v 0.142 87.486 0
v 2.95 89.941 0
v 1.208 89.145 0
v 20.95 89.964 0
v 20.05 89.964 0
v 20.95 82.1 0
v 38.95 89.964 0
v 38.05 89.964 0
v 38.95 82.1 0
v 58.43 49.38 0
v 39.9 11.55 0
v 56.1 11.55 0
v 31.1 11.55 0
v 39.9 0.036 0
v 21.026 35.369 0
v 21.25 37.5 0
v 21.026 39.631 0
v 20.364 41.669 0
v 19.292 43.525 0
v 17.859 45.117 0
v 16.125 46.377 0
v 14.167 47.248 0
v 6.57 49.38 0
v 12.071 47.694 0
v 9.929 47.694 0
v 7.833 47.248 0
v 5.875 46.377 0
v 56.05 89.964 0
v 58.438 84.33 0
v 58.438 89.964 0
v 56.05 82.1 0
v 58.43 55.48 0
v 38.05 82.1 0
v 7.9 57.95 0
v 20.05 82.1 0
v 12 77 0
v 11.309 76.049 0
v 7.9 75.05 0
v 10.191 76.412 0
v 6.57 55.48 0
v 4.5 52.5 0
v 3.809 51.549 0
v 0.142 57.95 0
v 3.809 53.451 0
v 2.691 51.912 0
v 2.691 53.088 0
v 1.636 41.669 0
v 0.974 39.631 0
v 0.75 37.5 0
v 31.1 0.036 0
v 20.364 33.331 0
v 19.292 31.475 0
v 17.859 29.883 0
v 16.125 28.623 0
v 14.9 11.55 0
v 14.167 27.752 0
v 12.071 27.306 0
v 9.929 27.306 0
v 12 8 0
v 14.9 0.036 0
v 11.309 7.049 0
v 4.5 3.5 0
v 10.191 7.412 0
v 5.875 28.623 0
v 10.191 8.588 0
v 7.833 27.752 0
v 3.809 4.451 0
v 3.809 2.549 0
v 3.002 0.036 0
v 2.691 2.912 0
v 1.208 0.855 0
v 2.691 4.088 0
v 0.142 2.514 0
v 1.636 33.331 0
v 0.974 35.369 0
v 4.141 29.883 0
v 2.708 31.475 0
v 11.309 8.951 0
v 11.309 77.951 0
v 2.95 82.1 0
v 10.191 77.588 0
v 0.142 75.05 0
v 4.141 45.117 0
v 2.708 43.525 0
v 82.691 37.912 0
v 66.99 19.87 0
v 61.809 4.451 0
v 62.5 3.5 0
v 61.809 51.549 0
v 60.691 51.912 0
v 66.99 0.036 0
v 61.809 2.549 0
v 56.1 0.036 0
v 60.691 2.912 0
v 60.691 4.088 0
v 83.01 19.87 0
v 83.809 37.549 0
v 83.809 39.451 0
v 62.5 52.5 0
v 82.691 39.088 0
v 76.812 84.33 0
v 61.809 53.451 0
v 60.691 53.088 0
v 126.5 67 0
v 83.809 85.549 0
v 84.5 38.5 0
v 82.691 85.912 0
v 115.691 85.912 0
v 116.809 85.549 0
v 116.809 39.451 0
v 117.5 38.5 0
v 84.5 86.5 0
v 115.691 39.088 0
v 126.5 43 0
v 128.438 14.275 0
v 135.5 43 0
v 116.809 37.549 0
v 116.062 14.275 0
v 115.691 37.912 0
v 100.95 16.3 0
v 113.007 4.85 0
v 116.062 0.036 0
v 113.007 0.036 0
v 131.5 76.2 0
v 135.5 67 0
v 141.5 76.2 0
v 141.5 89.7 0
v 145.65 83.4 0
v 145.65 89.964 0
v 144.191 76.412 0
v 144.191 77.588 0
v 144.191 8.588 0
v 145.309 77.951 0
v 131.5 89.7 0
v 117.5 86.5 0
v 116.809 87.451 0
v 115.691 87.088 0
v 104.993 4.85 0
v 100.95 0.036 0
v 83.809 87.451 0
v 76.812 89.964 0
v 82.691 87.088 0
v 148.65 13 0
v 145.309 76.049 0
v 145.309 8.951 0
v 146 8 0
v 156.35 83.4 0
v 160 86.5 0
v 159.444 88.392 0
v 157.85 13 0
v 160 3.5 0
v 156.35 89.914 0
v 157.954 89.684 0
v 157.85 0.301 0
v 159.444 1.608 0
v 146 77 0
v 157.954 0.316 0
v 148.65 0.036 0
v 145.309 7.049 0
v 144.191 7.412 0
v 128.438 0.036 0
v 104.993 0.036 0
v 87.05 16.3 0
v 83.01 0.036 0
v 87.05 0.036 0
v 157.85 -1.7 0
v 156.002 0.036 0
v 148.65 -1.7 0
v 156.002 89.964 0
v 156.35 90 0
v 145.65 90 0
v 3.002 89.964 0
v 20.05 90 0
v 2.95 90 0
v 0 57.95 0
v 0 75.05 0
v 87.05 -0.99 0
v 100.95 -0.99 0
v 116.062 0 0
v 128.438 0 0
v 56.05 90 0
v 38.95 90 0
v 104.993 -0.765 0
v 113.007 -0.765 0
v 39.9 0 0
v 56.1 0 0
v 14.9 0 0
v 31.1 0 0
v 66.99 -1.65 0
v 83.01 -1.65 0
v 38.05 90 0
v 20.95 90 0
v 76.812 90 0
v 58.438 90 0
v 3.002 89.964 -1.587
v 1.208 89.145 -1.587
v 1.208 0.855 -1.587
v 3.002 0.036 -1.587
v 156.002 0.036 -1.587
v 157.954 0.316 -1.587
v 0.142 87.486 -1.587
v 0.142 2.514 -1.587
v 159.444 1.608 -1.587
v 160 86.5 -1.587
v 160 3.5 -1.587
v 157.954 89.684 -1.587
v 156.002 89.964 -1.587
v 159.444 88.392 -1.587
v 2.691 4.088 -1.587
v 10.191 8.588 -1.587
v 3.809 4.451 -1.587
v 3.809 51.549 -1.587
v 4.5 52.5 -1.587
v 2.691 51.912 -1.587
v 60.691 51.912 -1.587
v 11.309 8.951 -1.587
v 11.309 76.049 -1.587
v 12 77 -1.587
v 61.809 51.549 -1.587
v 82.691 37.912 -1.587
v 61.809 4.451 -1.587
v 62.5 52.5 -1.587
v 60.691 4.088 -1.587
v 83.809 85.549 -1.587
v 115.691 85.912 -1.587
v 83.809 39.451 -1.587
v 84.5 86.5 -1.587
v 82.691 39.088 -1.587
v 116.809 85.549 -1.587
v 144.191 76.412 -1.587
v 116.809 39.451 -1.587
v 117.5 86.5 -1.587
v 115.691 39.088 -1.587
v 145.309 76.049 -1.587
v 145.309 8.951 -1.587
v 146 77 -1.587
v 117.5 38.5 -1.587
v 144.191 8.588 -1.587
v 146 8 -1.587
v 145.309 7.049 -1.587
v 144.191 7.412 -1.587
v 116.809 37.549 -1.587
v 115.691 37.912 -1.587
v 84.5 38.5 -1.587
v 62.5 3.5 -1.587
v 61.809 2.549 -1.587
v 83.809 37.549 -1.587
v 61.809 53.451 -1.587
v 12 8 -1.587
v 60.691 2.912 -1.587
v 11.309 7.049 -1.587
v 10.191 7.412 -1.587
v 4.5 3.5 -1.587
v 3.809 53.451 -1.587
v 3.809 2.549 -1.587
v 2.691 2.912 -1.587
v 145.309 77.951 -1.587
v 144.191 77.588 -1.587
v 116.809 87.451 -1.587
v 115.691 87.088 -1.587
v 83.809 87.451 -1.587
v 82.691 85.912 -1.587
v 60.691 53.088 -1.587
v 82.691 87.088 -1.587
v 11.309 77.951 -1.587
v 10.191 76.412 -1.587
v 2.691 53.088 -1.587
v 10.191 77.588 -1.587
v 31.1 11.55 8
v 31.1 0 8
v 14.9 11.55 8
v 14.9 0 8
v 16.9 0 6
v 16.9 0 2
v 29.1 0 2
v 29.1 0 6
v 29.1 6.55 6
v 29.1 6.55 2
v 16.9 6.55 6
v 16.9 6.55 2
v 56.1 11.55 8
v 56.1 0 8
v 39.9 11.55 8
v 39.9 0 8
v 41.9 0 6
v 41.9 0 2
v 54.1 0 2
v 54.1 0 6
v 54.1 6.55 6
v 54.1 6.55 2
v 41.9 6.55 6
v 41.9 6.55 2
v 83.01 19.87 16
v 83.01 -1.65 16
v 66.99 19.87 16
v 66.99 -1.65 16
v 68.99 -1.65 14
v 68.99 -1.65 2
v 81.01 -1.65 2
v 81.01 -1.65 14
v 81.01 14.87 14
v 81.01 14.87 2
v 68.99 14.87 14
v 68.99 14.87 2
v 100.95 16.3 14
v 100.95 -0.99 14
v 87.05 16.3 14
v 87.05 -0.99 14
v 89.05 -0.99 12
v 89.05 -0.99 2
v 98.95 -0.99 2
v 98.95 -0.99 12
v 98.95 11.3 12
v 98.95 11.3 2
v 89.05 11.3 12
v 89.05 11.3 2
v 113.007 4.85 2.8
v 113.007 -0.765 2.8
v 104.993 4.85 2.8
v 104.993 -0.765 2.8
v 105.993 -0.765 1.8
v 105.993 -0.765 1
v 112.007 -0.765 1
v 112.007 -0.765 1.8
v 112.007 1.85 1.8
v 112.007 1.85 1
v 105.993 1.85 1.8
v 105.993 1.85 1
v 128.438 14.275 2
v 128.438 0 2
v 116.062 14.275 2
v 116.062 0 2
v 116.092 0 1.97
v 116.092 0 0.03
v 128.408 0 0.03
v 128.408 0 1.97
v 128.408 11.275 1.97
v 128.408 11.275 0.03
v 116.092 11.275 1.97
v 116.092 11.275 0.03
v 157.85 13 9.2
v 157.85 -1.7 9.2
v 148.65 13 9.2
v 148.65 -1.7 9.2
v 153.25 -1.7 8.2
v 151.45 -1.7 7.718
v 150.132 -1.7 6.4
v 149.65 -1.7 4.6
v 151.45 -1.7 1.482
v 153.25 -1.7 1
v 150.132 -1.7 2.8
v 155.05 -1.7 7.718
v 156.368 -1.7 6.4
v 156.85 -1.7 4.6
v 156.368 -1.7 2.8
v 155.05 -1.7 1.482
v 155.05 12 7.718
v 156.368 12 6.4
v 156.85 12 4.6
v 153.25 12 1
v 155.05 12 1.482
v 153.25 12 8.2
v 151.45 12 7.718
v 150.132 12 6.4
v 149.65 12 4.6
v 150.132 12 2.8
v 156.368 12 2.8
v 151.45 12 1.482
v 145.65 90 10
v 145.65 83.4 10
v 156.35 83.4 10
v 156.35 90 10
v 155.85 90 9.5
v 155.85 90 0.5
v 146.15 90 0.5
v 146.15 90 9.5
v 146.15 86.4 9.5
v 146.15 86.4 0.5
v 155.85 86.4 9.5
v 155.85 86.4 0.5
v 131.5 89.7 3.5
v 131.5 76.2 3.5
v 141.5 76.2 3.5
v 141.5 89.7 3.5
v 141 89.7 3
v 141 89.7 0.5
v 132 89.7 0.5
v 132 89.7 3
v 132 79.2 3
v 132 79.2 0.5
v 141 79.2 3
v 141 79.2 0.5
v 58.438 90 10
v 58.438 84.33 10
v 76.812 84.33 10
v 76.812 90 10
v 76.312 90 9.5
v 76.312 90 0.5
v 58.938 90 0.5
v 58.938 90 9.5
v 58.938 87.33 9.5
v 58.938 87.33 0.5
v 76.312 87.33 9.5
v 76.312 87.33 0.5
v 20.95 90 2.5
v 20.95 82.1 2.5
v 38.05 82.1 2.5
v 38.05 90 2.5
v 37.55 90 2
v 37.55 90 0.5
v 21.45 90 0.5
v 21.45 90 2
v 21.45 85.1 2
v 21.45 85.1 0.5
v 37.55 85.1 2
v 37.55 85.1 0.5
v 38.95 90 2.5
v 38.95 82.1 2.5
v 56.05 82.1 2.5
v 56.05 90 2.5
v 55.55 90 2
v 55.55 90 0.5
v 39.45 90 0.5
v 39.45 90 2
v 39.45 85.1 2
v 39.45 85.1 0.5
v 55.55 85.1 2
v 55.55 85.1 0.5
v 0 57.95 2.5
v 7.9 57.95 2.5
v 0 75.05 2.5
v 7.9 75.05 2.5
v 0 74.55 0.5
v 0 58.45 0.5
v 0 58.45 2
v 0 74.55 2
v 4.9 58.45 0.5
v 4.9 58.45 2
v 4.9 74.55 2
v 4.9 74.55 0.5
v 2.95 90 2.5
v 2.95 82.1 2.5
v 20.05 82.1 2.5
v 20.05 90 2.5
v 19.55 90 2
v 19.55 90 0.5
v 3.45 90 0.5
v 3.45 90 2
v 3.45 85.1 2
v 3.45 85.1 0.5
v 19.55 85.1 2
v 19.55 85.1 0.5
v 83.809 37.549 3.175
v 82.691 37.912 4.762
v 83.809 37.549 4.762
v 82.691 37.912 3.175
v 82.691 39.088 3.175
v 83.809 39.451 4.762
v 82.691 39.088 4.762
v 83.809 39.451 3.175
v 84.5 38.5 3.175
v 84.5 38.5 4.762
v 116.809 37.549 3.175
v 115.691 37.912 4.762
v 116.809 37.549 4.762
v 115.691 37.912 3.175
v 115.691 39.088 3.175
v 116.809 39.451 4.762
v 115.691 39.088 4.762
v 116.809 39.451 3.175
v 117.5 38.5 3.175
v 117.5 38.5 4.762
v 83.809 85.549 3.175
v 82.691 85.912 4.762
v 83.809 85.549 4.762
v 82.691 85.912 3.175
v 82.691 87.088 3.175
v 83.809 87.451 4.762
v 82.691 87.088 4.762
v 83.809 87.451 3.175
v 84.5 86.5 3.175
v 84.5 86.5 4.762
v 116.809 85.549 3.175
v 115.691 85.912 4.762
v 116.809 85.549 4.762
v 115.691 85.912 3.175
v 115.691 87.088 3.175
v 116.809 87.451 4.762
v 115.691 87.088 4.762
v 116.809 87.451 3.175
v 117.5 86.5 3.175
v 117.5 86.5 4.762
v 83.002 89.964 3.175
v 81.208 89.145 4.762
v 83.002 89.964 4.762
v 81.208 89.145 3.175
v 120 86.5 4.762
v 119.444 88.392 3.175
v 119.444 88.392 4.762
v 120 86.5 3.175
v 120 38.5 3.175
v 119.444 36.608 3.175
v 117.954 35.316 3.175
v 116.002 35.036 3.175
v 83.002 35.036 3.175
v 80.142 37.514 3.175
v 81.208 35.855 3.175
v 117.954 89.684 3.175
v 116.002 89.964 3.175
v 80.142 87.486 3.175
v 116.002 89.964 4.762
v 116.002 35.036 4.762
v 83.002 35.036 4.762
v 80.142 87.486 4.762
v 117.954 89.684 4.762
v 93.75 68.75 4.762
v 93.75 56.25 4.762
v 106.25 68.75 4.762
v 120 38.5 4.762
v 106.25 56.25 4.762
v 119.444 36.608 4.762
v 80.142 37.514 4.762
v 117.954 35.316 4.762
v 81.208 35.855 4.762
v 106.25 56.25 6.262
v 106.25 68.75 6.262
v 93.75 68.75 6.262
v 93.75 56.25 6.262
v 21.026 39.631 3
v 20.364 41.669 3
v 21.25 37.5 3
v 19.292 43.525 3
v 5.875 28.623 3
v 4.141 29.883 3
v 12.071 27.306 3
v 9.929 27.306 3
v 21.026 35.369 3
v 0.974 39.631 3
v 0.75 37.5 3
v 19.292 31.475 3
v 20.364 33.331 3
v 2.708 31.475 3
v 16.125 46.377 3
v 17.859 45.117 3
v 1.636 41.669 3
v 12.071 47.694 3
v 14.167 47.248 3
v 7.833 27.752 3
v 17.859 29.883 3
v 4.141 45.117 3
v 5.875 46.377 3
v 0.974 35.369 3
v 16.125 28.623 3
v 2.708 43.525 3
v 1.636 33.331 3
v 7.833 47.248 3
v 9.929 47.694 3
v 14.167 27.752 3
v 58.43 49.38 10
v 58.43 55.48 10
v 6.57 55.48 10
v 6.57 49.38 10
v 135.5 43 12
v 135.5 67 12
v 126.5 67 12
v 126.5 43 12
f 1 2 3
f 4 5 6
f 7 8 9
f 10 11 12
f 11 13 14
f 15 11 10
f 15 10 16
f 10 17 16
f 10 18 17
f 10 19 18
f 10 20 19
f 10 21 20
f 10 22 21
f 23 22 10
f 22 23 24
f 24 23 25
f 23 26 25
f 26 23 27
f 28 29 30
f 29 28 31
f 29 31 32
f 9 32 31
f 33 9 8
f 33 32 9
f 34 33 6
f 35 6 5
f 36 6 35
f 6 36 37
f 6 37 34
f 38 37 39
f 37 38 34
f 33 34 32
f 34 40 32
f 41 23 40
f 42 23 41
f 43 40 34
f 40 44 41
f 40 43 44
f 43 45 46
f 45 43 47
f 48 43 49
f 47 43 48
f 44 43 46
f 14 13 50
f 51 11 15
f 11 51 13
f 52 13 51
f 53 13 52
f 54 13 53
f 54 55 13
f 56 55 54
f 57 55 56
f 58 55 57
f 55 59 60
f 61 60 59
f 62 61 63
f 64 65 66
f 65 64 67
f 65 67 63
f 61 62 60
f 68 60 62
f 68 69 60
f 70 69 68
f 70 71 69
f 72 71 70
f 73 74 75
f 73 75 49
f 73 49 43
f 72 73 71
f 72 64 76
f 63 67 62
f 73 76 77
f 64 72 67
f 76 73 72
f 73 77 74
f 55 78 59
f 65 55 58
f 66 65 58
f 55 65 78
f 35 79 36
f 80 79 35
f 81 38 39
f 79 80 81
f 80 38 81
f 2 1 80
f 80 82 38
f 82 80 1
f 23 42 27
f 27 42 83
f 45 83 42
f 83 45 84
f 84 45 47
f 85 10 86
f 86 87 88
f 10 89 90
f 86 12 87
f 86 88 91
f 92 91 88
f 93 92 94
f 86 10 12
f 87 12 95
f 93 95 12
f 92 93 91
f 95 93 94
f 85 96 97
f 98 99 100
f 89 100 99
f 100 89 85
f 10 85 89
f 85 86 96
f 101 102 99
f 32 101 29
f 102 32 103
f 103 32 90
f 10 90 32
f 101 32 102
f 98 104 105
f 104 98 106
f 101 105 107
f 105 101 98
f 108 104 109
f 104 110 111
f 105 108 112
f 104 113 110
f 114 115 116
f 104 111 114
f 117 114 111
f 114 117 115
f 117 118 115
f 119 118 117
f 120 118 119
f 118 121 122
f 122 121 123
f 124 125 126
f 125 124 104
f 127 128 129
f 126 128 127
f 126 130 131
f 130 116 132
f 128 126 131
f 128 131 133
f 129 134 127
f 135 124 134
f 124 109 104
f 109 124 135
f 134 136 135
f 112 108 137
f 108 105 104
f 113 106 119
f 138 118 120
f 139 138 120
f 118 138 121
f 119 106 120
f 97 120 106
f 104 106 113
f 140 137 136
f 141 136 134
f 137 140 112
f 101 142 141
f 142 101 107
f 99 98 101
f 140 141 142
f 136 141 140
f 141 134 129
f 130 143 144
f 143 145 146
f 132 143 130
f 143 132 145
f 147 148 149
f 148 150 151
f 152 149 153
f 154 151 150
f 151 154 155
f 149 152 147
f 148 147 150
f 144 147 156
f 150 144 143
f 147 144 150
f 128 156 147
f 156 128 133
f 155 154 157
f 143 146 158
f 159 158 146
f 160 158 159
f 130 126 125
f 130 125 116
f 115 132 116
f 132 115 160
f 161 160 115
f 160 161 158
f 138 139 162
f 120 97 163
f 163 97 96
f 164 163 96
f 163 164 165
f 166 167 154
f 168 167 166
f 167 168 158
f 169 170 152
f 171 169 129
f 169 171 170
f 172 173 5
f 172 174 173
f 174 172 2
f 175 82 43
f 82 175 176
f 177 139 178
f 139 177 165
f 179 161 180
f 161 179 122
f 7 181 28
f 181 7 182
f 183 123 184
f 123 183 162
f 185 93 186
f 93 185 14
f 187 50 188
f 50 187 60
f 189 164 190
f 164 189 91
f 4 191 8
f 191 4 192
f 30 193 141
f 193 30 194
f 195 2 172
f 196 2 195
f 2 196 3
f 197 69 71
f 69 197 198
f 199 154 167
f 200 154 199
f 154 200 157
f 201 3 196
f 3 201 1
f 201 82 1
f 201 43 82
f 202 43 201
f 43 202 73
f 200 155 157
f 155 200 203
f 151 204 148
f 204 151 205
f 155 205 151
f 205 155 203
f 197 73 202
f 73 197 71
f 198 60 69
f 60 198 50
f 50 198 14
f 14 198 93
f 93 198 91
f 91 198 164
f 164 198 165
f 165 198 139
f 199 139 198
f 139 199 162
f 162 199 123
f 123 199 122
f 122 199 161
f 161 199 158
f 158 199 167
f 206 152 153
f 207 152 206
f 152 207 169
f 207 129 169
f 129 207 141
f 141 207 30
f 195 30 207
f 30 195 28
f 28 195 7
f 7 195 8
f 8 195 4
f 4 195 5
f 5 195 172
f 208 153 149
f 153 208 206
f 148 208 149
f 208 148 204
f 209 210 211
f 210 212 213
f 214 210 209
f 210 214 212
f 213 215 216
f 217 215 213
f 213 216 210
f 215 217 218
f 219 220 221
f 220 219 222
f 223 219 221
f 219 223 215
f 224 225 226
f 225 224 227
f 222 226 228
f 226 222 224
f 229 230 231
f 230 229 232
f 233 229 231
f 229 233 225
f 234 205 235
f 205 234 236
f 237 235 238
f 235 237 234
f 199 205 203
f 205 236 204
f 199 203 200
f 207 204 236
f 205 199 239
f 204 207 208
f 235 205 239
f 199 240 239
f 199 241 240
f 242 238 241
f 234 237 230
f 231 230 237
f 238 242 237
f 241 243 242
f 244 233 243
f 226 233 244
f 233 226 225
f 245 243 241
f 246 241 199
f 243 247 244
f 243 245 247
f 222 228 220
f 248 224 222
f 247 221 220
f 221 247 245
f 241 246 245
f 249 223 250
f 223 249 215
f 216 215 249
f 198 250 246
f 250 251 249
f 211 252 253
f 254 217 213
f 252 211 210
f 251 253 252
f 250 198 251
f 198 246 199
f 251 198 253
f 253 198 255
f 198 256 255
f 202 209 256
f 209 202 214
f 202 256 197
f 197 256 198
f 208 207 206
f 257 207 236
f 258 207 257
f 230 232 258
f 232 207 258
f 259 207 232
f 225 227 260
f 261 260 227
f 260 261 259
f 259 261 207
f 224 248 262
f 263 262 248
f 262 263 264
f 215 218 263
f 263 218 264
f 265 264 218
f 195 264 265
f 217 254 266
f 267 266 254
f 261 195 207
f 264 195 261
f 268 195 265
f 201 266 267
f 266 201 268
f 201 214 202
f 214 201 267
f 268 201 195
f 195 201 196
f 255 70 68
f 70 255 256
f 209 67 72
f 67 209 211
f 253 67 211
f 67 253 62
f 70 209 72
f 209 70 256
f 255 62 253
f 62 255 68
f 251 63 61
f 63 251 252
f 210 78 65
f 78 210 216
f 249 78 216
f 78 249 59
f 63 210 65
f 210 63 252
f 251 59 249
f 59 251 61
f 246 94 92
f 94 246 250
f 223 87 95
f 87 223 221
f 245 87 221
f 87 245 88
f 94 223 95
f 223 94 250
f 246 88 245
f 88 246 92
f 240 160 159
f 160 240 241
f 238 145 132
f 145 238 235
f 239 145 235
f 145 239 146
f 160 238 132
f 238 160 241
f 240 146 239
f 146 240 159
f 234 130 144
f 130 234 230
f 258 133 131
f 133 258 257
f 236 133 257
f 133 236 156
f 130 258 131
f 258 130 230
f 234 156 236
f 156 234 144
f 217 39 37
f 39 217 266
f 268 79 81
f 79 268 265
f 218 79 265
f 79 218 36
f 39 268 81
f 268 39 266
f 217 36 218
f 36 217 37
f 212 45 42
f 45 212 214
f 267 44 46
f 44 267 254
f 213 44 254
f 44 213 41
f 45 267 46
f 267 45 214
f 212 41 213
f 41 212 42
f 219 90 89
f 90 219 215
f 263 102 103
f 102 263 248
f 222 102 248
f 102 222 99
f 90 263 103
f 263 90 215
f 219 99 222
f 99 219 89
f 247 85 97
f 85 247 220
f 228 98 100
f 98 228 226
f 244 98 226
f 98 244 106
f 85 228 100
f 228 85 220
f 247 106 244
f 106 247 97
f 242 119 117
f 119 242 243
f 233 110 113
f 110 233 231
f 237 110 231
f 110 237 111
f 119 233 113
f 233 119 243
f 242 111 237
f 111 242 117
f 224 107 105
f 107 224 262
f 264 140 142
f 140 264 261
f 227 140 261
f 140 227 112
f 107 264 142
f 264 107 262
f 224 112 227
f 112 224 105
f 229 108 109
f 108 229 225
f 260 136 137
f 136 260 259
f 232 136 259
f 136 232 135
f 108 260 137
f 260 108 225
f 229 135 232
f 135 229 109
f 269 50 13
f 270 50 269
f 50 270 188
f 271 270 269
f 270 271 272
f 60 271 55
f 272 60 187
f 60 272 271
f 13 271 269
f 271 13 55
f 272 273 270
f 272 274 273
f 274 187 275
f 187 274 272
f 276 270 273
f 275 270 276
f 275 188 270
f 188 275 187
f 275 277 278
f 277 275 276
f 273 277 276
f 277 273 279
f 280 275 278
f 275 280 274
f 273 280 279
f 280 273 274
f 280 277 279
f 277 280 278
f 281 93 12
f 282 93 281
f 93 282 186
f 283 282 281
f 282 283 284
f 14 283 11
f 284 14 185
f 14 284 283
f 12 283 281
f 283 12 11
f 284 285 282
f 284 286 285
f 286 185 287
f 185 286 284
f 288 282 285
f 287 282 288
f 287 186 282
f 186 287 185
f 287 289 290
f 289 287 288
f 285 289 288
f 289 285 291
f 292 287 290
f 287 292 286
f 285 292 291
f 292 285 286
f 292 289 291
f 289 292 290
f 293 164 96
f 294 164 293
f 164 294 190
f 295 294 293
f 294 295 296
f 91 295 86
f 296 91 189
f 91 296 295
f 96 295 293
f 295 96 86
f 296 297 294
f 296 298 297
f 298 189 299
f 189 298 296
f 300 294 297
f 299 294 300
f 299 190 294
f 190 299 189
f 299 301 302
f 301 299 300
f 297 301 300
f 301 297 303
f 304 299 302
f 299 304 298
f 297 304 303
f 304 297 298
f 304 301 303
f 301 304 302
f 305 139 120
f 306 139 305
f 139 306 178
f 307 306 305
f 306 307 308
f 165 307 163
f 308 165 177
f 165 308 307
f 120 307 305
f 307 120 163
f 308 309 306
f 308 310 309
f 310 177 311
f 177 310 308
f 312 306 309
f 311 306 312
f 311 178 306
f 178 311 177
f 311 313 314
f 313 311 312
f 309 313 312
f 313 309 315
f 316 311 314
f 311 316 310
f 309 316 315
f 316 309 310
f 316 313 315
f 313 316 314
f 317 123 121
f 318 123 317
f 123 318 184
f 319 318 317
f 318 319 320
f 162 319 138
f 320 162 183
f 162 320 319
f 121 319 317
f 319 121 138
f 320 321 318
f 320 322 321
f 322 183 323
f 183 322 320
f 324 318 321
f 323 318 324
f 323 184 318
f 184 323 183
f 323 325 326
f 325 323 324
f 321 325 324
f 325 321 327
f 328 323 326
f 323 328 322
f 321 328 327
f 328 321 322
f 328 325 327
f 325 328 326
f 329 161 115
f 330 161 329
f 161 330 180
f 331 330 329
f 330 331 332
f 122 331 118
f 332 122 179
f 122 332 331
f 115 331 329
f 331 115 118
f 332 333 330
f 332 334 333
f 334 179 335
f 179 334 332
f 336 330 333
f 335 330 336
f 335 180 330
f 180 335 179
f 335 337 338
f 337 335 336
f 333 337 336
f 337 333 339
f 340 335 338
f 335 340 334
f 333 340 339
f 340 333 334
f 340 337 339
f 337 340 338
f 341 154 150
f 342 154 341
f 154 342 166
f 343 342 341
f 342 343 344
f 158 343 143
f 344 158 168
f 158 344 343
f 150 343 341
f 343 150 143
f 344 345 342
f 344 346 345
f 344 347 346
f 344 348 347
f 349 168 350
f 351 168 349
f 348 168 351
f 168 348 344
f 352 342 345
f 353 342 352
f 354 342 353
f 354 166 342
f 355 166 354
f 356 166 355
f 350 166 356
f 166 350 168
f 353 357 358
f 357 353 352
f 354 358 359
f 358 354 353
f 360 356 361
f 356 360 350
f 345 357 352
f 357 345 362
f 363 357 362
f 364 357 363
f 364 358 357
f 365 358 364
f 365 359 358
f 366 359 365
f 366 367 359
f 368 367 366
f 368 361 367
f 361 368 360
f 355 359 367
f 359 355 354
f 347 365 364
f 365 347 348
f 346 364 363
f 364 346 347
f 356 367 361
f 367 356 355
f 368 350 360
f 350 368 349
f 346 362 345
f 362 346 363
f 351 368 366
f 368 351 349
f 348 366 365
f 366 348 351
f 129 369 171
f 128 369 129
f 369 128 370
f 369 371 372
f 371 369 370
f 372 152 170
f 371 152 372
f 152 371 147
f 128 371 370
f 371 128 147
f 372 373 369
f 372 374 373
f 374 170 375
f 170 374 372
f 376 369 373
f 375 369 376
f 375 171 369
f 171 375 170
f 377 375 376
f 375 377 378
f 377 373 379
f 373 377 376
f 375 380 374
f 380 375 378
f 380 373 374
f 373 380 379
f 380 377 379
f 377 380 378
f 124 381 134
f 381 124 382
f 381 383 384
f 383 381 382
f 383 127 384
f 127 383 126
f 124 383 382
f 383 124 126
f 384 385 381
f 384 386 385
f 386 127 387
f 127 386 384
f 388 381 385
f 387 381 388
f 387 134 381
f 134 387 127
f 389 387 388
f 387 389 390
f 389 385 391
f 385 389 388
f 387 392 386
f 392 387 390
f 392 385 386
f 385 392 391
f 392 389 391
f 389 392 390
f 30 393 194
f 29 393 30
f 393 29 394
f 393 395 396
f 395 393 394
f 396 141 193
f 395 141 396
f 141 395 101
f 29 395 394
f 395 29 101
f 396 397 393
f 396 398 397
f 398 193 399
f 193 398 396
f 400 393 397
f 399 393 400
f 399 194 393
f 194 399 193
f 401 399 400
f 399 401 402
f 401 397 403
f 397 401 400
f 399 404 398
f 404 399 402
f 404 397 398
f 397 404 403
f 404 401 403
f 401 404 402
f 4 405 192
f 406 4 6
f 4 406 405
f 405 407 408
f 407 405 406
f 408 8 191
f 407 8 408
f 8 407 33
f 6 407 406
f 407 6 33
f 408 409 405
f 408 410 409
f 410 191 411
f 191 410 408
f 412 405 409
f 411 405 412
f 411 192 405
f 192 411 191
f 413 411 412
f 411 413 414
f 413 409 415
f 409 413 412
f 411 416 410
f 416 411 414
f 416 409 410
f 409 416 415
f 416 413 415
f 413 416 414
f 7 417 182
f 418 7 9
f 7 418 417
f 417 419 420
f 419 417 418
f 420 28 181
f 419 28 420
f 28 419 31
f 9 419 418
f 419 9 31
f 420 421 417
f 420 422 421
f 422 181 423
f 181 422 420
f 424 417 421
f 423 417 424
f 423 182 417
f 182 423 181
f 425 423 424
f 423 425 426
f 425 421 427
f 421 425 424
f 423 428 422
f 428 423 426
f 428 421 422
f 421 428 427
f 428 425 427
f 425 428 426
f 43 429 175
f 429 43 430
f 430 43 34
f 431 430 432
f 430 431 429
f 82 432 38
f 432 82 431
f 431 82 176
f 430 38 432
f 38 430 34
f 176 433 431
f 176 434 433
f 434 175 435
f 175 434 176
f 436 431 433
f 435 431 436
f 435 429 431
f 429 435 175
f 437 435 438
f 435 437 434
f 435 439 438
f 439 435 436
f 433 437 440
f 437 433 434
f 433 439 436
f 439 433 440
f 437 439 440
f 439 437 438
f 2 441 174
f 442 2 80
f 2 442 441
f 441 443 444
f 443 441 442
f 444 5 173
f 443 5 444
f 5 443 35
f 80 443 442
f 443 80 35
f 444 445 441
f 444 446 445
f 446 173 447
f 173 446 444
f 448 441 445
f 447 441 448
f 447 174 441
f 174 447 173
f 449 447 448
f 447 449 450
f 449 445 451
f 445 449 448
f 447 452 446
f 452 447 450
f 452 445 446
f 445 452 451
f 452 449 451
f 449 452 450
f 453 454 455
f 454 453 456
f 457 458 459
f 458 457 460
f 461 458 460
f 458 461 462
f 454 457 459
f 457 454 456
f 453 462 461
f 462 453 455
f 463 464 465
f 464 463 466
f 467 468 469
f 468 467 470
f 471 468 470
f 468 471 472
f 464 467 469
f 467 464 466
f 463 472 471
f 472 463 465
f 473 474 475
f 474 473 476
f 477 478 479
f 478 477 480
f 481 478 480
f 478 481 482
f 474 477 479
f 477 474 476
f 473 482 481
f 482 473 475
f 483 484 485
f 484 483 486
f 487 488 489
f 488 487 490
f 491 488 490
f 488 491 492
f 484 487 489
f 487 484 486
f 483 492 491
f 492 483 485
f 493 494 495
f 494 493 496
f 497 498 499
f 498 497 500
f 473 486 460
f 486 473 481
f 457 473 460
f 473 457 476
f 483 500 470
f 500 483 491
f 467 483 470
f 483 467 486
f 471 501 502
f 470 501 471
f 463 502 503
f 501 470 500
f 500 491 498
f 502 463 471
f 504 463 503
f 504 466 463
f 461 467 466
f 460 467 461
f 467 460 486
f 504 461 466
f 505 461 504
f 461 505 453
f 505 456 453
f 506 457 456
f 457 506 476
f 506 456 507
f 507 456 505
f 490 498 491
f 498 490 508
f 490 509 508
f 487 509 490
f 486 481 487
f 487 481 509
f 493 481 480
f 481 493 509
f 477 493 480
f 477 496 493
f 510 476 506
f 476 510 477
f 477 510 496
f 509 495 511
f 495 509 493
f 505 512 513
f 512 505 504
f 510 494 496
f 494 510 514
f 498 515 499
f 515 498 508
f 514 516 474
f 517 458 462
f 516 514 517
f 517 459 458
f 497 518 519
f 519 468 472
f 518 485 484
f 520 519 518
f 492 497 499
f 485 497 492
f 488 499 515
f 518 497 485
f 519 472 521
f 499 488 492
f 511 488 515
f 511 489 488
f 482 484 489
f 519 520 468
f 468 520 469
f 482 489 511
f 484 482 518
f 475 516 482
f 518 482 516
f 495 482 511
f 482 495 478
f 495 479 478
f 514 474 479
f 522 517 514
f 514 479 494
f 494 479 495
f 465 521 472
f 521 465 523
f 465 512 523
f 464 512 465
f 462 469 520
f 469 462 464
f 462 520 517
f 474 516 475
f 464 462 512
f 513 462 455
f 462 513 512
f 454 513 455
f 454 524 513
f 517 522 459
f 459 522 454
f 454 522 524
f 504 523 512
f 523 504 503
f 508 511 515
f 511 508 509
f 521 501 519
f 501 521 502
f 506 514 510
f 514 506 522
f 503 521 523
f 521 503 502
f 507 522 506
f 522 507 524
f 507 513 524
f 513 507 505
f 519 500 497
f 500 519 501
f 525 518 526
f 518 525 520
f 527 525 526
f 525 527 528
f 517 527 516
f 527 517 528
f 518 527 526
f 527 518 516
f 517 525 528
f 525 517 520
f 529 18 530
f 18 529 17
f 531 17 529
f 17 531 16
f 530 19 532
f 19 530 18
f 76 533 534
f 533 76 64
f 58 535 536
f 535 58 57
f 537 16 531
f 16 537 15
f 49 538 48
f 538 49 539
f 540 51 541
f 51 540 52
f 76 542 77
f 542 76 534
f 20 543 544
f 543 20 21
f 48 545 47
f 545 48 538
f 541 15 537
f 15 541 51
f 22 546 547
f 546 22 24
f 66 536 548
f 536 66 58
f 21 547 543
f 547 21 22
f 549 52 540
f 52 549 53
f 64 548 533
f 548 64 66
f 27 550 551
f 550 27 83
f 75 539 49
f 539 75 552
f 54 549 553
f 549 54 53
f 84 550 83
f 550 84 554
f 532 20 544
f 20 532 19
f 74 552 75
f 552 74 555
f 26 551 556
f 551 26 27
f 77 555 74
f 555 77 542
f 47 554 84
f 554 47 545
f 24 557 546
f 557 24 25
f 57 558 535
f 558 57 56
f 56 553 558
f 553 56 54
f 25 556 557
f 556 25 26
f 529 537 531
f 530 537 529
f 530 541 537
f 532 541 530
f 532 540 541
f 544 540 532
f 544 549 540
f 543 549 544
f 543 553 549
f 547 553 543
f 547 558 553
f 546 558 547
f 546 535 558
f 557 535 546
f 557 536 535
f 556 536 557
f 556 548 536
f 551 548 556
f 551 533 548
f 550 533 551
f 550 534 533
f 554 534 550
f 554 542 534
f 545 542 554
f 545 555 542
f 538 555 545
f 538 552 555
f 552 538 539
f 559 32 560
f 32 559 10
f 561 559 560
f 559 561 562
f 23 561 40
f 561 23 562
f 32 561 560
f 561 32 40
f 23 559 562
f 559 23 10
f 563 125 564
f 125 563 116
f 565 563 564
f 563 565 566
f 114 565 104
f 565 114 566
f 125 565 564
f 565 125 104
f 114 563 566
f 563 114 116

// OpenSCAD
// file: dimensions.scad
/* Dimensions for CM4 IO board, Rev 5b
 * Author: Ray Depew
 * Date: 4 Nov 2020
 */

// All dimensions are in mm, NOT inches.

/* Notation:
 * _x, _x1, _x2 are location values from datum 0.
 * _y, _y1, _y2 are location values from datum 0.
 * _z, _z1, _z2 are location values from datum 0.
 *
 * Datum 0 is lower-left corner of the board.
 *
 * _w, _l, _h are x, y, z dimensions of an object.
 * _d, _r are diameter, radius.
 * _thk is thickness.
 * _alpha is transparency (1.0 = opaque)
 * 
 * Rotation in xy plane:
 * 0 is down (-y)
 * 90 is right (+x)
 * 180 is up (+y)
 * 270 is left (-x)
*/ 

// Board outline
bd_w = 160;
bd_l = 90;
bd_h = 25.4/16; // standard 1/16" PCB
bd_corner_r = 3.5;
// Mounting holes
mh_r = 1;
mh1_x = 3.5;
mh1_y = 3.5;
mh2_x = 11;
mh2_y = 8;
mh3_x = 61.5;
mh3_y = 3.5;
mh4_x = 145;
mh4_y = 8;
mh5_x = 145;
mh5_y = 77;
mh6_x = 11;
mh6_y = 77;
// HAT
mh7_x = 11;
mh7_y = 77;
mh8_x = 11;
mh8_y = 77;
// CM4
mh9_x = 3.5;
mh9_y = 52.5;
mh10_x = 61.5;
mh10_y = 52.5;
mh11_x = 83.5;
mh11_y = 38.5;
mh12_x = 116.5;
mh12_y = 38.5;
mh13_x = 83.5;
mh13_y = 86.5;
mh14_x = 116.5;
mh14_y = 86.5;

/* Component dimensions, counterclockwise from datum
 * _w, _l, _h are x, y, z dimensions of an object.
 * x, y are the location of the component datum.
 * a is angle of rotation around the component datum.
 */
hdmi_w = 16.2;
hdmi_l = 11.55;
hdmi_h = 8;
hdmi0_x = 23;
hdmi0_y = 0;
hdmi0_a = 0;
hdmi1_x = 48;
hdmi1_y = 0;
hdmi1_a = 0;
eth_w = 16.02;
eth_l = 21.52;
eth_h = 16;
eth_x = 75;
eth_y = -1.65;
eth_a = 0;
usb_w = 13.9;
usb_l = 17.29;
usb_h = 14;
usb_x = 94;
usb_y = -0.99;
usb_a = 0;
usbslv_w = 8.015;
usbslv_l = 5.615;
usbslv_h = 2.8;
usbslv_x = 109;
usbslv_y = -0.765;
usbslv_a = 0;
sdcard_w = 12.375;
sdcard_l = 14.275;
sdcard_h = 2;
sdcard_x = 122.25;
sdcard_y = 0;
sdcard_a = 0;
p12v_w = 9.2;
p12v_l = 14.7;
p12v_h = 9.2;
p12v_x = 153.25;
p12v_y = -1.7;
p12v_a = 0;
fan_w = 10.7;
fan_l = 6.6;
fan_h = 10;
fan_x = 151;
fan_y = 90;
fan_a = 180;
p5v_w = 10;
p5v_l = 13.5;
p5v_h = 3.5;
p5v_x = 136.5;
p5v_y = 89.7;
p5v_a = 180;
disp_w = 17.1;
disp_l = 7.9;
disp_h = 2.5;
disp0_x = 29.5;
disp0_y = 90;
disp0_a = 180;
disp1_x = 47.5;
disp1_y = 90;
disp1_a = 180;
cam_w = 17.1;
cam_l = 7.9;
cam_h = 2.5;
cam0_x = 0;
cam0_y = 66.5;
cam0_a = 270;
cam1_x = 11.5;
cam1_y = 90;
cam1_a = 180;
batt_w = 10.25;
batt_l = 10.25;
batt_h = 3;
batt_r = 10.25;
batt_x = 11;
batt_y = 37.5;
batt_a = 270;
hat_w = 51.86;
hat_l = 6.1;
hat_h = 10;
hat_x = 6.57;
hat_y = 49.38;
hat_a = 0;
pcie_w = 9;
pcie_l = 24;
pcie_h = 12;
pcie_x = 126.5;
pcie_y = 43;
pcie_a = 0;
cm4_w = 40;
cm4_l = 55;
cm4_h = 25.4/16;
cm4_x = 80;
cm4_y = 35.0;
cm4_a = 0;
j2_w = 18.375;
j2_l = 5.670;
j2_h = hat_h;
j2_x = 67.625;
j2_y = 90;
j2_a = 180;
// main file
/* CM4 IO board, Rev 5b
 * Author: Ray Depew
 * Date: 4 Nov 2020
 */

// All dimensions are in mm, NOT inches.

// Variables

/* Notation:
 * _x, _x1, _x2 are location values from datum 0.
 * _y, _y1, _y2 are location values from datum 0.
 * _z, _z1, _z2 are location values from datum 0.
 *
 * Datum 0 is lower-left corner of the board.
 *
 * _w, _l, _h are x, y, z dimensions of an object.
 * _d, _r are diameter, radius.
 * _thk is thickness.
 * _alpha is transparency (1.0 = opaque)
 * 
 * Rotation in xy plane:
 * 0 is down (-y)
 * 90 is right (+x)
 * 180 is up (+y)
 * 270 is left (-x)
*/ 

include <dimensions.scad>

/**********************************************************
 * Component modules
 **********************************************************
 */

// FIRST: The Raspberry Pi Zero W
module board() {
  // IO board blank
  color("green", alpha = 1.0) {
    difference() {
      translate([bd_corner_r, bd_corner_r, -bd_h])
      linear_extrude(height = bd_h)
      minkowski() {
        square([bd_w - 2 * bd_corner_r,
                bd_l - 2 * bd_corner_r]);
        circle(bd_corner_r);
      }
      // Mounting holes 
      translate([mh1_x, mh1_y, -5]) cylinder(r=mh_r, h=10);
      translate([mh2_x, mh2_y, -5]) cylinder(r=mh_r, h=10);
      translate([mh3_x, mh3_y, -5]) cylinder(r=mh_r, h=10);
      translate([mh4_x, mh4_y, -5]) cylinder(r=mh_r, h=10);
      translate([mh5_x, mh5_y, -5]) cylinder(r=mh_r, h=10);
      translate([mh6_x, mh6_y, -5]) cylinder(r=mh_r, h=10);
      translate([mh7_x, mh7_y, -5]) cylinder(r=mh_r, h=10);
      translate([mh8_x, mh8_y, -5]) cylinder(r=mh_r, h=10);
      translate([mh9_x, mh9_y, -5]) cylinder(r=mh_r, h=10);
      translate([mh10_x, mh10_y, -5]) cylinder(r=mh_r, h=10);
      translate([mh11_x, mh11_y, -5]) cylinder(r=mh_r, h=10);
      translate([mh12_x, mh12_y, -5]) cylinder(r=mh_r, h=10);
      translate([mh13_x, mh13_y, -5]) cylinder(r=mh_r, h=10);
      translate([mh14_x, mh14_y, -5]) cylinder(r=mh_r, h=10);
    }
  }
}

module connectors() {
  hdmi(hdmi0_x, hdmi0_y, hdmi0_a);
  hdmi(hdmi1_x, hdmi1_y, hdmi1_a);
  eth(eth_x, eth_y, eth_a);
  usb(usb_x, usb_y, usb_a);
  usbslave(usbslv_x, usbslv_y, usbslv_a);
  sdcard(sdcard_x, sdcard_y, sdcard_a);
  p12v(p12v_x, p12v_y, p12v_a);
  fan(fan_x, fan_y, fan_a);
  p5v(p5v_x, p5v_y, p5v_a);
  j2(j2_x, j2_y, j2_a);
  disp(disp0_x, disp0_y, disp0_a);
  disp(disp1_x, disp1_y, disp1_a);
  cam(cam0_x, cam0_y, cam0_a);
  cam(cam1_x, cam1_y, cam1_a);
  battery(batt_x, batt_y, batt_a);
  hat(hat_x, hat_y, hat_a);
  pcie(pcie_x, pcie_y, pcie_a);
  cm4(cm4_x, cm4_y, cm4_a);
}

// hdmi datum is center of bottom outside edge
module hdmi(x, y, a) {
  translate([x, y, 0]) rotate([0, 0, a])
    translate([-hdmi_w/2, 0, 0]) difference() {
      cube([hdmi_w, hdmi_l, hdmi_h]);
      translate([2,-1, 2]) 
        cube([hdmi_w-4, hdmi_l-4, hdmi_h-4]);
    }
}

// eth datum is center of bottom outside edge
module eth(x, y, a) {
  translate([x, y, 0]) rotate([0, 0, a])
    translate([-eth_w/2,0,0]) difference() {
      cube([eth_w, eth_l, eth_h]);
      translate([2,-1,2]) 
        cube([eth_w-4, eth_l-4, eth_h-4]);
  }
}

// usb datum is center of bottom outside edge
module usb(x, y, a) {
  translate([x, y, 0]) rotate([0, 0, a])
    translate([-usb_w/2,0,0]) difference() {
      cube([usb_w, usb_l, usb_h]);
      translate([2,-1,2])
        cube([usb_w-4, usb_l-4, usb_h-4]);
  }
}

// usbslave datum is center of bottom outside edge
module usbslave(x, y, a) {
  translate([x, y, 0]) rotate([0, 0, a])
    translate([-usbslv_w/2,0,0]) difference() {
      cube([usbslv_w, usbslv_l, usbslv_h]);
      translate([1,-1,1]) 
        cube([usbslv_w-2, usbslv_l-2, usbslv_h-2]);
  }
}

// sdcard datum is center of bottom outside edge
module sdcard(x, y, a) {
  translate([x, y, 0]) rotate([0, 0, a])
    translate([-sdcard_w/2,0,0]) difference() {
      cube([sdcard_w, sdcard_l, sdcard_h]);
      translate([0.03,-1,0.03])
        cube([sdcard_w-0.06, sdcard_l-2, sdcard_h-0.06]);
  }
}

// p12v datum is center of bottom outside edge
module p12v(x, y, a) {
  color("darkslategrey")
  translate([x, y, 0]) rotate([0, 0, a])
    translate([-p12v_w/2,0,0]) difference() {
      cube([p12v_w, p12v_l, p12v_h]);
      translate([p12v_w/2, p12v_l - 1, p12v_w/2])
        rotate([90, 0, 0])
          cylinder(r=p12v_w/2-1, h=p12v_l);
  }
}

// p5v datum is center of bottom outside edge
module p5v(x, y, a) {
  translate([x, y, 0]) rotate([0, 0, a])
    translate([-p5v_w/2, 0, 0]) difference() {
      cube([p5v_w, p5v_l, p5v_h]);
      translate([0.5,-1,0.5])
        cube([p5v_w-1, p5v_l-2, p5v_h-1]);
  }
}

// fan datum is center of bottom outside edge
module fan(x, y, a) {
  color("white")
  translate([x, y, 0]) rotate([0, 0, a])
    translate([-fan_w/2, 0, 0]) difference() {
      cube([fan_w, fan_l, fan_h]);
      translate([0.5,-1,0.5])
        cube([fan_w-1, fan_l-2, fan_h-1]);
  }
}

// j2 datum is center of bottom outside edge
module j2(x, y, a) {
  color("darkslategrey")
  translate([x, y, 0]) rotate([0, 0, a])
    translate([-j2_w/2, 0, 0]) difference() {
      cube([j2_w, j2_l, j2_h]);
      translate([0.5,-1,0.5])
        cube([j2_w-1, j2_l-2, j2_h-1]);
  }
}

// disp datum is center of bottom outside edge
module disp(x, y, a) {
  translate([x, y, 0]) rotate([0, 0, a])
    translate([-disp_w/2,0,0]) difference() {
      cube([disp_w, disp_l, disp_h]);
      translate([0.5,-1,0.5])
        cube([disp_w-1, disp_l-2, disp_h-1]);
  }
}

// cam datum is center of bottom outside edge
module cam(x, y, a) {
  translate([x, y, 0]) rotate([0, 0, a])
    translate([-cam_w/2,0,0]) difference() {
      cube([cam_w, cam_l, cam_h]);
      translate([0.5,-1, 0.5])
        cube([cam_w-1, cam_l-2, cam_h-1]);
  }
}

// battery datum is bottom center of battery
module battery(x, y, a) {
  color("silver")
  translate([x, y, 0])
    cylinder(r=batt_r, h=batt_h);
}

// hat datum is lower left corner
module hat(x, y, a) {
  color("darkslategrey")
  translate([x, y, 0]) rotate([0, 0, a])
    cube([hat_w, hat_l, hat_h]);
}

// pcie datum is lower left corner
module pcie(x, y, a) {
  color("darkslategrey")
  translate([x, y, 0]) rotate([0, 0, a])
    cube([pcie_w, pcie_l, pcie_h]);
}

// cm4 datum is lower left corner
module cm4(x, y, a) {
  translate([x + 3.5,
             y + 3.5,
             25.4/8]) {
    color("green")
      difference() {
        union() {
          linear_extrude(height = bd_h)
             minkowski() {
               square([cm4_w - 2 * bd_corner_r,
                       cm4_l - 2 * bd_corner_r]);
               circle(bd_corner_r);
             }
        }
        union() {
          translate([0, 0, -5]) cylinder(r=mh_r, h=10);
          translate([33, 0, -5]) cylinder(r=mh_r, h=10);
          translate([0, 48, -5]) cylinder(r=mh_r, h=10);
          translate([33, 48, -5]) cylinder(r=mh_r, h=10);
        }
      }
    chip_w = 12.5;
    chip_l = 12.5;
    chip_h = 1.5;
    color("silver")
      translate([(cm4_w-chip_w)/2 - bd_corner_r,
                 (cm4_l-chip_l)/2 - bd_corner_r,
                 bd_h])
        cube([chip_w, chip_l, chip_h]);
  }
}

/**********************************************************
 * Final assembly
 **********************************************************
 */

// Bare board
board();
connectors();
